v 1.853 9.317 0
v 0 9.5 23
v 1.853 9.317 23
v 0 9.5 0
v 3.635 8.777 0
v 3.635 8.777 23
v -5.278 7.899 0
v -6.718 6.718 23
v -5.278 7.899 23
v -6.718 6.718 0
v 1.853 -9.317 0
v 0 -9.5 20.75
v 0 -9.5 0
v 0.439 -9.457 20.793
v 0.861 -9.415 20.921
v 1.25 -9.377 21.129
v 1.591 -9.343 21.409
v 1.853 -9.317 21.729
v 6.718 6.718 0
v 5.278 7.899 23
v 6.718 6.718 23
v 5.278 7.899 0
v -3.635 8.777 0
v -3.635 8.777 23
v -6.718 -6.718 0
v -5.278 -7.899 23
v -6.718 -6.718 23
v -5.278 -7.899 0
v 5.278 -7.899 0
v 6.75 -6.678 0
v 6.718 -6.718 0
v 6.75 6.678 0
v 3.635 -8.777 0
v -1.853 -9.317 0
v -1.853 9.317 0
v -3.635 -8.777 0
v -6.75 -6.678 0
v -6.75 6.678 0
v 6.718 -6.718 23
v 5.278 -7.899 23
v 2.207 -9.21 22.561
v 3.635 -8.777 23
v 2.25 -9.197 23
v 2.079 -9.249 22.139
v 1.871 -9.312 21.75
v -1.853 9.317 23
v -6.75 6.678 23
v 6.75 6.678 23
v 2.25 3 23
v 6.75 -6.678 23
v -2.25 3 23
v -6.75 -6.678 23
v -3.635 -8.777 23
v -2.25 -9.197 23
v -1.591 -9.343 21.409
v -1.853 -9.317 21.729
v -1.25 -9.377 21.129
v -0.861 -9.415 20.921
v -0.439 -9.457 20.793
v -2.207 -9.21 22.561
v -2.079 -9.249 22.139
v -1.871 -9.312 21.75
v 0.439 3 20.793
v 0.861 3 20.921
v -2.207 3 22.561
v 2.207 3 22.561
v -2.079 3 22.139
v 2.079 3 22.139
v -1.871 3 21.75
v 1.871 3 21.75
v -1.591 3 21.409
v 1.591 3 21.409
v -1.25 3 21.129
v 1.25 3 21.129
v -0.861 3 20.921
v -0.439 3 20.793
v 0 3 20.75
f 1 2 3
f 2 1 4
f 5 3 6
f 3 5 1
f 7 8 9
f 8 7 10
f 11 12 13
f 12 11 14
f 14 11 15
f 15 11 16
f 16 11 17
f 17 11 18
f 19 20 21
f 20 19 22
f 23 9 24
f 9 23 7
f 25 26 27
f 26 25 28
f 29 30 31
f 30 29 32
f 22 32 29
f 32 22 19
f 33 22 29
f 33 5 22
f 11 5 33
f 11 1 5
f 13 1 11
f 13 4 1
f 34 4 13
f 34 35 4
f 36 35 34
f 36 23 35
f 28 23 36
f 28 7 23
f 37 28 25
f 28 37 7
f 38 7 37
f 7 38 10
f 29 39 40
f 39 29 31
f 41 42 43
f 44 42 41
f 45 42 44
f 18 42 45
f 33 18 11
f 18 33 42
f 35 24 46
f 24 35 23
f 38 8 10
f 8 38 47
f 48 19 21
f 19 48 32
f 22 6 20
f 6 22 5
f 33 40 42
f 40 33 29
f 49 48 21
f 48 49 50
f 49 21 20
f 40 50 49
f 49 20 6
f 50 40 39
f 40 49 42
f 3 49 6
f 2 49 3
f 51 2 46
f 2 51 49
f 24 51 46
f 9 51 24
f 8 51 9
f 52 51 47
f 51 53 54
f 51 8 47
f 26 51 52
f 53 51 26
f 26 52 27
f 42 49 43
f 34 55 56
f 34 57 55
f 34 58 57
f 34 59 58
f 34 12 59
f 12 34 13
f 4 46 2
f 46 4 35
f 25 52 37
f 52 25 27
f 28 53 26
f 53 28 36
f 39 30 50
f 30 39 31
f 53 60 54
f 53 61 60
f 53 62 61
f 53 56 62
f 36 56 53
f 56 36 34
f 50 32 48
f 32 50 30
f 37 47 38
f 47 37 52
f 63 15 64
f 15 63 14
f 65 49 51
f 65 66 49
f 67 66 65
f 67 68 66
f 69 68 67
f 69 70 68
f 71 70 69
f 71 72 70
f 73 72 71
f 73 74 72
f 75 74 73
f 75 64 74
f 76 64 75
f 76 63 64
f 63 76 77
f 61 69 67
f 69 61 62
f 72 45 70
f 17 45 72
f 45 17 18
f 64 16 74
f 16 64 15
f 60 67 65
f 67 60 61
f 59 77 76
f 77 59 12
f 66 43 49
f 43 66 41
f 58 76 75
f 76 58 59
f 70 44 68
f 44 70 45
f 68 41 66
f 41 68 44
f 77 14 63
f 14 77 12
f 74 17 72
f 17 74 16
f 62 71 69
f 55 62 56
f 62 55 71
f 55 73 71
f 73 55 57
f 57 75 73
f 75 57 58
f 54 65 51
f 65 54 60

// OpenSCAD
$fn=32;
poleR=7;
postR=2.25;

// intersection() {
//   basePart(postR);
//   translate([-16,-50,0]) cube([32,100,100]);
// }

postInsert(postR);

module postInsert(holeR) {
  h=46;
  difference() {
    intersection() {
      cylinder(r=9.5,h=h/2);
      translate([-13.5/2,-10,0]) cube([13.5,20,h/2]);
    }
    translate([0,3,h/2]) rotate([90,0,0]) cylinder(r=holeR,h=100);
  }
}

// translate([0,0,62.8]) mirror([0,0,1]) dremilPart();

module basePart(holeR) {
  difference() {
    h=46;
    cylinder(r=30,h=h);
   translate([0,50,h/2]) rotate([90,0,0]) cylinder(r=holeR,h=100);
    translate([0,0,-1]) cylinder(r=9.75,h=h+2);
    translate([0,0,-1]) difference() {
      cylinder(r=13.75,h=h+2);

      hull() {
        translate([0,50,0]) rotate([90,0,0]) cylinder(r=13.5/2,h=100);
        translate([0,50,h/2]) rotate([90,0,0]) cylinder(r=13.5/2,h=100);
      }
      
    }
}
}

module dremilPart() {
  difference() {
    cylinder(r=13.5,h=62.8);
    translate([0,0,-0.1]) cylinder(r=9.75,h=2.1);
    translate([0,0,0.4]) import("dremel_thread.stl");
    translate([0,0,12.8]) cylinder(r=9.75,h=50.1);
    hull() {
      translate([0,50,39.8]) rotate([90,0,0]) cylinder(r=7,h=100);
      translate([0,50,69.8]) rotate([90,0,0]) cylinder(r=7,h=100);
    }
  }
}
